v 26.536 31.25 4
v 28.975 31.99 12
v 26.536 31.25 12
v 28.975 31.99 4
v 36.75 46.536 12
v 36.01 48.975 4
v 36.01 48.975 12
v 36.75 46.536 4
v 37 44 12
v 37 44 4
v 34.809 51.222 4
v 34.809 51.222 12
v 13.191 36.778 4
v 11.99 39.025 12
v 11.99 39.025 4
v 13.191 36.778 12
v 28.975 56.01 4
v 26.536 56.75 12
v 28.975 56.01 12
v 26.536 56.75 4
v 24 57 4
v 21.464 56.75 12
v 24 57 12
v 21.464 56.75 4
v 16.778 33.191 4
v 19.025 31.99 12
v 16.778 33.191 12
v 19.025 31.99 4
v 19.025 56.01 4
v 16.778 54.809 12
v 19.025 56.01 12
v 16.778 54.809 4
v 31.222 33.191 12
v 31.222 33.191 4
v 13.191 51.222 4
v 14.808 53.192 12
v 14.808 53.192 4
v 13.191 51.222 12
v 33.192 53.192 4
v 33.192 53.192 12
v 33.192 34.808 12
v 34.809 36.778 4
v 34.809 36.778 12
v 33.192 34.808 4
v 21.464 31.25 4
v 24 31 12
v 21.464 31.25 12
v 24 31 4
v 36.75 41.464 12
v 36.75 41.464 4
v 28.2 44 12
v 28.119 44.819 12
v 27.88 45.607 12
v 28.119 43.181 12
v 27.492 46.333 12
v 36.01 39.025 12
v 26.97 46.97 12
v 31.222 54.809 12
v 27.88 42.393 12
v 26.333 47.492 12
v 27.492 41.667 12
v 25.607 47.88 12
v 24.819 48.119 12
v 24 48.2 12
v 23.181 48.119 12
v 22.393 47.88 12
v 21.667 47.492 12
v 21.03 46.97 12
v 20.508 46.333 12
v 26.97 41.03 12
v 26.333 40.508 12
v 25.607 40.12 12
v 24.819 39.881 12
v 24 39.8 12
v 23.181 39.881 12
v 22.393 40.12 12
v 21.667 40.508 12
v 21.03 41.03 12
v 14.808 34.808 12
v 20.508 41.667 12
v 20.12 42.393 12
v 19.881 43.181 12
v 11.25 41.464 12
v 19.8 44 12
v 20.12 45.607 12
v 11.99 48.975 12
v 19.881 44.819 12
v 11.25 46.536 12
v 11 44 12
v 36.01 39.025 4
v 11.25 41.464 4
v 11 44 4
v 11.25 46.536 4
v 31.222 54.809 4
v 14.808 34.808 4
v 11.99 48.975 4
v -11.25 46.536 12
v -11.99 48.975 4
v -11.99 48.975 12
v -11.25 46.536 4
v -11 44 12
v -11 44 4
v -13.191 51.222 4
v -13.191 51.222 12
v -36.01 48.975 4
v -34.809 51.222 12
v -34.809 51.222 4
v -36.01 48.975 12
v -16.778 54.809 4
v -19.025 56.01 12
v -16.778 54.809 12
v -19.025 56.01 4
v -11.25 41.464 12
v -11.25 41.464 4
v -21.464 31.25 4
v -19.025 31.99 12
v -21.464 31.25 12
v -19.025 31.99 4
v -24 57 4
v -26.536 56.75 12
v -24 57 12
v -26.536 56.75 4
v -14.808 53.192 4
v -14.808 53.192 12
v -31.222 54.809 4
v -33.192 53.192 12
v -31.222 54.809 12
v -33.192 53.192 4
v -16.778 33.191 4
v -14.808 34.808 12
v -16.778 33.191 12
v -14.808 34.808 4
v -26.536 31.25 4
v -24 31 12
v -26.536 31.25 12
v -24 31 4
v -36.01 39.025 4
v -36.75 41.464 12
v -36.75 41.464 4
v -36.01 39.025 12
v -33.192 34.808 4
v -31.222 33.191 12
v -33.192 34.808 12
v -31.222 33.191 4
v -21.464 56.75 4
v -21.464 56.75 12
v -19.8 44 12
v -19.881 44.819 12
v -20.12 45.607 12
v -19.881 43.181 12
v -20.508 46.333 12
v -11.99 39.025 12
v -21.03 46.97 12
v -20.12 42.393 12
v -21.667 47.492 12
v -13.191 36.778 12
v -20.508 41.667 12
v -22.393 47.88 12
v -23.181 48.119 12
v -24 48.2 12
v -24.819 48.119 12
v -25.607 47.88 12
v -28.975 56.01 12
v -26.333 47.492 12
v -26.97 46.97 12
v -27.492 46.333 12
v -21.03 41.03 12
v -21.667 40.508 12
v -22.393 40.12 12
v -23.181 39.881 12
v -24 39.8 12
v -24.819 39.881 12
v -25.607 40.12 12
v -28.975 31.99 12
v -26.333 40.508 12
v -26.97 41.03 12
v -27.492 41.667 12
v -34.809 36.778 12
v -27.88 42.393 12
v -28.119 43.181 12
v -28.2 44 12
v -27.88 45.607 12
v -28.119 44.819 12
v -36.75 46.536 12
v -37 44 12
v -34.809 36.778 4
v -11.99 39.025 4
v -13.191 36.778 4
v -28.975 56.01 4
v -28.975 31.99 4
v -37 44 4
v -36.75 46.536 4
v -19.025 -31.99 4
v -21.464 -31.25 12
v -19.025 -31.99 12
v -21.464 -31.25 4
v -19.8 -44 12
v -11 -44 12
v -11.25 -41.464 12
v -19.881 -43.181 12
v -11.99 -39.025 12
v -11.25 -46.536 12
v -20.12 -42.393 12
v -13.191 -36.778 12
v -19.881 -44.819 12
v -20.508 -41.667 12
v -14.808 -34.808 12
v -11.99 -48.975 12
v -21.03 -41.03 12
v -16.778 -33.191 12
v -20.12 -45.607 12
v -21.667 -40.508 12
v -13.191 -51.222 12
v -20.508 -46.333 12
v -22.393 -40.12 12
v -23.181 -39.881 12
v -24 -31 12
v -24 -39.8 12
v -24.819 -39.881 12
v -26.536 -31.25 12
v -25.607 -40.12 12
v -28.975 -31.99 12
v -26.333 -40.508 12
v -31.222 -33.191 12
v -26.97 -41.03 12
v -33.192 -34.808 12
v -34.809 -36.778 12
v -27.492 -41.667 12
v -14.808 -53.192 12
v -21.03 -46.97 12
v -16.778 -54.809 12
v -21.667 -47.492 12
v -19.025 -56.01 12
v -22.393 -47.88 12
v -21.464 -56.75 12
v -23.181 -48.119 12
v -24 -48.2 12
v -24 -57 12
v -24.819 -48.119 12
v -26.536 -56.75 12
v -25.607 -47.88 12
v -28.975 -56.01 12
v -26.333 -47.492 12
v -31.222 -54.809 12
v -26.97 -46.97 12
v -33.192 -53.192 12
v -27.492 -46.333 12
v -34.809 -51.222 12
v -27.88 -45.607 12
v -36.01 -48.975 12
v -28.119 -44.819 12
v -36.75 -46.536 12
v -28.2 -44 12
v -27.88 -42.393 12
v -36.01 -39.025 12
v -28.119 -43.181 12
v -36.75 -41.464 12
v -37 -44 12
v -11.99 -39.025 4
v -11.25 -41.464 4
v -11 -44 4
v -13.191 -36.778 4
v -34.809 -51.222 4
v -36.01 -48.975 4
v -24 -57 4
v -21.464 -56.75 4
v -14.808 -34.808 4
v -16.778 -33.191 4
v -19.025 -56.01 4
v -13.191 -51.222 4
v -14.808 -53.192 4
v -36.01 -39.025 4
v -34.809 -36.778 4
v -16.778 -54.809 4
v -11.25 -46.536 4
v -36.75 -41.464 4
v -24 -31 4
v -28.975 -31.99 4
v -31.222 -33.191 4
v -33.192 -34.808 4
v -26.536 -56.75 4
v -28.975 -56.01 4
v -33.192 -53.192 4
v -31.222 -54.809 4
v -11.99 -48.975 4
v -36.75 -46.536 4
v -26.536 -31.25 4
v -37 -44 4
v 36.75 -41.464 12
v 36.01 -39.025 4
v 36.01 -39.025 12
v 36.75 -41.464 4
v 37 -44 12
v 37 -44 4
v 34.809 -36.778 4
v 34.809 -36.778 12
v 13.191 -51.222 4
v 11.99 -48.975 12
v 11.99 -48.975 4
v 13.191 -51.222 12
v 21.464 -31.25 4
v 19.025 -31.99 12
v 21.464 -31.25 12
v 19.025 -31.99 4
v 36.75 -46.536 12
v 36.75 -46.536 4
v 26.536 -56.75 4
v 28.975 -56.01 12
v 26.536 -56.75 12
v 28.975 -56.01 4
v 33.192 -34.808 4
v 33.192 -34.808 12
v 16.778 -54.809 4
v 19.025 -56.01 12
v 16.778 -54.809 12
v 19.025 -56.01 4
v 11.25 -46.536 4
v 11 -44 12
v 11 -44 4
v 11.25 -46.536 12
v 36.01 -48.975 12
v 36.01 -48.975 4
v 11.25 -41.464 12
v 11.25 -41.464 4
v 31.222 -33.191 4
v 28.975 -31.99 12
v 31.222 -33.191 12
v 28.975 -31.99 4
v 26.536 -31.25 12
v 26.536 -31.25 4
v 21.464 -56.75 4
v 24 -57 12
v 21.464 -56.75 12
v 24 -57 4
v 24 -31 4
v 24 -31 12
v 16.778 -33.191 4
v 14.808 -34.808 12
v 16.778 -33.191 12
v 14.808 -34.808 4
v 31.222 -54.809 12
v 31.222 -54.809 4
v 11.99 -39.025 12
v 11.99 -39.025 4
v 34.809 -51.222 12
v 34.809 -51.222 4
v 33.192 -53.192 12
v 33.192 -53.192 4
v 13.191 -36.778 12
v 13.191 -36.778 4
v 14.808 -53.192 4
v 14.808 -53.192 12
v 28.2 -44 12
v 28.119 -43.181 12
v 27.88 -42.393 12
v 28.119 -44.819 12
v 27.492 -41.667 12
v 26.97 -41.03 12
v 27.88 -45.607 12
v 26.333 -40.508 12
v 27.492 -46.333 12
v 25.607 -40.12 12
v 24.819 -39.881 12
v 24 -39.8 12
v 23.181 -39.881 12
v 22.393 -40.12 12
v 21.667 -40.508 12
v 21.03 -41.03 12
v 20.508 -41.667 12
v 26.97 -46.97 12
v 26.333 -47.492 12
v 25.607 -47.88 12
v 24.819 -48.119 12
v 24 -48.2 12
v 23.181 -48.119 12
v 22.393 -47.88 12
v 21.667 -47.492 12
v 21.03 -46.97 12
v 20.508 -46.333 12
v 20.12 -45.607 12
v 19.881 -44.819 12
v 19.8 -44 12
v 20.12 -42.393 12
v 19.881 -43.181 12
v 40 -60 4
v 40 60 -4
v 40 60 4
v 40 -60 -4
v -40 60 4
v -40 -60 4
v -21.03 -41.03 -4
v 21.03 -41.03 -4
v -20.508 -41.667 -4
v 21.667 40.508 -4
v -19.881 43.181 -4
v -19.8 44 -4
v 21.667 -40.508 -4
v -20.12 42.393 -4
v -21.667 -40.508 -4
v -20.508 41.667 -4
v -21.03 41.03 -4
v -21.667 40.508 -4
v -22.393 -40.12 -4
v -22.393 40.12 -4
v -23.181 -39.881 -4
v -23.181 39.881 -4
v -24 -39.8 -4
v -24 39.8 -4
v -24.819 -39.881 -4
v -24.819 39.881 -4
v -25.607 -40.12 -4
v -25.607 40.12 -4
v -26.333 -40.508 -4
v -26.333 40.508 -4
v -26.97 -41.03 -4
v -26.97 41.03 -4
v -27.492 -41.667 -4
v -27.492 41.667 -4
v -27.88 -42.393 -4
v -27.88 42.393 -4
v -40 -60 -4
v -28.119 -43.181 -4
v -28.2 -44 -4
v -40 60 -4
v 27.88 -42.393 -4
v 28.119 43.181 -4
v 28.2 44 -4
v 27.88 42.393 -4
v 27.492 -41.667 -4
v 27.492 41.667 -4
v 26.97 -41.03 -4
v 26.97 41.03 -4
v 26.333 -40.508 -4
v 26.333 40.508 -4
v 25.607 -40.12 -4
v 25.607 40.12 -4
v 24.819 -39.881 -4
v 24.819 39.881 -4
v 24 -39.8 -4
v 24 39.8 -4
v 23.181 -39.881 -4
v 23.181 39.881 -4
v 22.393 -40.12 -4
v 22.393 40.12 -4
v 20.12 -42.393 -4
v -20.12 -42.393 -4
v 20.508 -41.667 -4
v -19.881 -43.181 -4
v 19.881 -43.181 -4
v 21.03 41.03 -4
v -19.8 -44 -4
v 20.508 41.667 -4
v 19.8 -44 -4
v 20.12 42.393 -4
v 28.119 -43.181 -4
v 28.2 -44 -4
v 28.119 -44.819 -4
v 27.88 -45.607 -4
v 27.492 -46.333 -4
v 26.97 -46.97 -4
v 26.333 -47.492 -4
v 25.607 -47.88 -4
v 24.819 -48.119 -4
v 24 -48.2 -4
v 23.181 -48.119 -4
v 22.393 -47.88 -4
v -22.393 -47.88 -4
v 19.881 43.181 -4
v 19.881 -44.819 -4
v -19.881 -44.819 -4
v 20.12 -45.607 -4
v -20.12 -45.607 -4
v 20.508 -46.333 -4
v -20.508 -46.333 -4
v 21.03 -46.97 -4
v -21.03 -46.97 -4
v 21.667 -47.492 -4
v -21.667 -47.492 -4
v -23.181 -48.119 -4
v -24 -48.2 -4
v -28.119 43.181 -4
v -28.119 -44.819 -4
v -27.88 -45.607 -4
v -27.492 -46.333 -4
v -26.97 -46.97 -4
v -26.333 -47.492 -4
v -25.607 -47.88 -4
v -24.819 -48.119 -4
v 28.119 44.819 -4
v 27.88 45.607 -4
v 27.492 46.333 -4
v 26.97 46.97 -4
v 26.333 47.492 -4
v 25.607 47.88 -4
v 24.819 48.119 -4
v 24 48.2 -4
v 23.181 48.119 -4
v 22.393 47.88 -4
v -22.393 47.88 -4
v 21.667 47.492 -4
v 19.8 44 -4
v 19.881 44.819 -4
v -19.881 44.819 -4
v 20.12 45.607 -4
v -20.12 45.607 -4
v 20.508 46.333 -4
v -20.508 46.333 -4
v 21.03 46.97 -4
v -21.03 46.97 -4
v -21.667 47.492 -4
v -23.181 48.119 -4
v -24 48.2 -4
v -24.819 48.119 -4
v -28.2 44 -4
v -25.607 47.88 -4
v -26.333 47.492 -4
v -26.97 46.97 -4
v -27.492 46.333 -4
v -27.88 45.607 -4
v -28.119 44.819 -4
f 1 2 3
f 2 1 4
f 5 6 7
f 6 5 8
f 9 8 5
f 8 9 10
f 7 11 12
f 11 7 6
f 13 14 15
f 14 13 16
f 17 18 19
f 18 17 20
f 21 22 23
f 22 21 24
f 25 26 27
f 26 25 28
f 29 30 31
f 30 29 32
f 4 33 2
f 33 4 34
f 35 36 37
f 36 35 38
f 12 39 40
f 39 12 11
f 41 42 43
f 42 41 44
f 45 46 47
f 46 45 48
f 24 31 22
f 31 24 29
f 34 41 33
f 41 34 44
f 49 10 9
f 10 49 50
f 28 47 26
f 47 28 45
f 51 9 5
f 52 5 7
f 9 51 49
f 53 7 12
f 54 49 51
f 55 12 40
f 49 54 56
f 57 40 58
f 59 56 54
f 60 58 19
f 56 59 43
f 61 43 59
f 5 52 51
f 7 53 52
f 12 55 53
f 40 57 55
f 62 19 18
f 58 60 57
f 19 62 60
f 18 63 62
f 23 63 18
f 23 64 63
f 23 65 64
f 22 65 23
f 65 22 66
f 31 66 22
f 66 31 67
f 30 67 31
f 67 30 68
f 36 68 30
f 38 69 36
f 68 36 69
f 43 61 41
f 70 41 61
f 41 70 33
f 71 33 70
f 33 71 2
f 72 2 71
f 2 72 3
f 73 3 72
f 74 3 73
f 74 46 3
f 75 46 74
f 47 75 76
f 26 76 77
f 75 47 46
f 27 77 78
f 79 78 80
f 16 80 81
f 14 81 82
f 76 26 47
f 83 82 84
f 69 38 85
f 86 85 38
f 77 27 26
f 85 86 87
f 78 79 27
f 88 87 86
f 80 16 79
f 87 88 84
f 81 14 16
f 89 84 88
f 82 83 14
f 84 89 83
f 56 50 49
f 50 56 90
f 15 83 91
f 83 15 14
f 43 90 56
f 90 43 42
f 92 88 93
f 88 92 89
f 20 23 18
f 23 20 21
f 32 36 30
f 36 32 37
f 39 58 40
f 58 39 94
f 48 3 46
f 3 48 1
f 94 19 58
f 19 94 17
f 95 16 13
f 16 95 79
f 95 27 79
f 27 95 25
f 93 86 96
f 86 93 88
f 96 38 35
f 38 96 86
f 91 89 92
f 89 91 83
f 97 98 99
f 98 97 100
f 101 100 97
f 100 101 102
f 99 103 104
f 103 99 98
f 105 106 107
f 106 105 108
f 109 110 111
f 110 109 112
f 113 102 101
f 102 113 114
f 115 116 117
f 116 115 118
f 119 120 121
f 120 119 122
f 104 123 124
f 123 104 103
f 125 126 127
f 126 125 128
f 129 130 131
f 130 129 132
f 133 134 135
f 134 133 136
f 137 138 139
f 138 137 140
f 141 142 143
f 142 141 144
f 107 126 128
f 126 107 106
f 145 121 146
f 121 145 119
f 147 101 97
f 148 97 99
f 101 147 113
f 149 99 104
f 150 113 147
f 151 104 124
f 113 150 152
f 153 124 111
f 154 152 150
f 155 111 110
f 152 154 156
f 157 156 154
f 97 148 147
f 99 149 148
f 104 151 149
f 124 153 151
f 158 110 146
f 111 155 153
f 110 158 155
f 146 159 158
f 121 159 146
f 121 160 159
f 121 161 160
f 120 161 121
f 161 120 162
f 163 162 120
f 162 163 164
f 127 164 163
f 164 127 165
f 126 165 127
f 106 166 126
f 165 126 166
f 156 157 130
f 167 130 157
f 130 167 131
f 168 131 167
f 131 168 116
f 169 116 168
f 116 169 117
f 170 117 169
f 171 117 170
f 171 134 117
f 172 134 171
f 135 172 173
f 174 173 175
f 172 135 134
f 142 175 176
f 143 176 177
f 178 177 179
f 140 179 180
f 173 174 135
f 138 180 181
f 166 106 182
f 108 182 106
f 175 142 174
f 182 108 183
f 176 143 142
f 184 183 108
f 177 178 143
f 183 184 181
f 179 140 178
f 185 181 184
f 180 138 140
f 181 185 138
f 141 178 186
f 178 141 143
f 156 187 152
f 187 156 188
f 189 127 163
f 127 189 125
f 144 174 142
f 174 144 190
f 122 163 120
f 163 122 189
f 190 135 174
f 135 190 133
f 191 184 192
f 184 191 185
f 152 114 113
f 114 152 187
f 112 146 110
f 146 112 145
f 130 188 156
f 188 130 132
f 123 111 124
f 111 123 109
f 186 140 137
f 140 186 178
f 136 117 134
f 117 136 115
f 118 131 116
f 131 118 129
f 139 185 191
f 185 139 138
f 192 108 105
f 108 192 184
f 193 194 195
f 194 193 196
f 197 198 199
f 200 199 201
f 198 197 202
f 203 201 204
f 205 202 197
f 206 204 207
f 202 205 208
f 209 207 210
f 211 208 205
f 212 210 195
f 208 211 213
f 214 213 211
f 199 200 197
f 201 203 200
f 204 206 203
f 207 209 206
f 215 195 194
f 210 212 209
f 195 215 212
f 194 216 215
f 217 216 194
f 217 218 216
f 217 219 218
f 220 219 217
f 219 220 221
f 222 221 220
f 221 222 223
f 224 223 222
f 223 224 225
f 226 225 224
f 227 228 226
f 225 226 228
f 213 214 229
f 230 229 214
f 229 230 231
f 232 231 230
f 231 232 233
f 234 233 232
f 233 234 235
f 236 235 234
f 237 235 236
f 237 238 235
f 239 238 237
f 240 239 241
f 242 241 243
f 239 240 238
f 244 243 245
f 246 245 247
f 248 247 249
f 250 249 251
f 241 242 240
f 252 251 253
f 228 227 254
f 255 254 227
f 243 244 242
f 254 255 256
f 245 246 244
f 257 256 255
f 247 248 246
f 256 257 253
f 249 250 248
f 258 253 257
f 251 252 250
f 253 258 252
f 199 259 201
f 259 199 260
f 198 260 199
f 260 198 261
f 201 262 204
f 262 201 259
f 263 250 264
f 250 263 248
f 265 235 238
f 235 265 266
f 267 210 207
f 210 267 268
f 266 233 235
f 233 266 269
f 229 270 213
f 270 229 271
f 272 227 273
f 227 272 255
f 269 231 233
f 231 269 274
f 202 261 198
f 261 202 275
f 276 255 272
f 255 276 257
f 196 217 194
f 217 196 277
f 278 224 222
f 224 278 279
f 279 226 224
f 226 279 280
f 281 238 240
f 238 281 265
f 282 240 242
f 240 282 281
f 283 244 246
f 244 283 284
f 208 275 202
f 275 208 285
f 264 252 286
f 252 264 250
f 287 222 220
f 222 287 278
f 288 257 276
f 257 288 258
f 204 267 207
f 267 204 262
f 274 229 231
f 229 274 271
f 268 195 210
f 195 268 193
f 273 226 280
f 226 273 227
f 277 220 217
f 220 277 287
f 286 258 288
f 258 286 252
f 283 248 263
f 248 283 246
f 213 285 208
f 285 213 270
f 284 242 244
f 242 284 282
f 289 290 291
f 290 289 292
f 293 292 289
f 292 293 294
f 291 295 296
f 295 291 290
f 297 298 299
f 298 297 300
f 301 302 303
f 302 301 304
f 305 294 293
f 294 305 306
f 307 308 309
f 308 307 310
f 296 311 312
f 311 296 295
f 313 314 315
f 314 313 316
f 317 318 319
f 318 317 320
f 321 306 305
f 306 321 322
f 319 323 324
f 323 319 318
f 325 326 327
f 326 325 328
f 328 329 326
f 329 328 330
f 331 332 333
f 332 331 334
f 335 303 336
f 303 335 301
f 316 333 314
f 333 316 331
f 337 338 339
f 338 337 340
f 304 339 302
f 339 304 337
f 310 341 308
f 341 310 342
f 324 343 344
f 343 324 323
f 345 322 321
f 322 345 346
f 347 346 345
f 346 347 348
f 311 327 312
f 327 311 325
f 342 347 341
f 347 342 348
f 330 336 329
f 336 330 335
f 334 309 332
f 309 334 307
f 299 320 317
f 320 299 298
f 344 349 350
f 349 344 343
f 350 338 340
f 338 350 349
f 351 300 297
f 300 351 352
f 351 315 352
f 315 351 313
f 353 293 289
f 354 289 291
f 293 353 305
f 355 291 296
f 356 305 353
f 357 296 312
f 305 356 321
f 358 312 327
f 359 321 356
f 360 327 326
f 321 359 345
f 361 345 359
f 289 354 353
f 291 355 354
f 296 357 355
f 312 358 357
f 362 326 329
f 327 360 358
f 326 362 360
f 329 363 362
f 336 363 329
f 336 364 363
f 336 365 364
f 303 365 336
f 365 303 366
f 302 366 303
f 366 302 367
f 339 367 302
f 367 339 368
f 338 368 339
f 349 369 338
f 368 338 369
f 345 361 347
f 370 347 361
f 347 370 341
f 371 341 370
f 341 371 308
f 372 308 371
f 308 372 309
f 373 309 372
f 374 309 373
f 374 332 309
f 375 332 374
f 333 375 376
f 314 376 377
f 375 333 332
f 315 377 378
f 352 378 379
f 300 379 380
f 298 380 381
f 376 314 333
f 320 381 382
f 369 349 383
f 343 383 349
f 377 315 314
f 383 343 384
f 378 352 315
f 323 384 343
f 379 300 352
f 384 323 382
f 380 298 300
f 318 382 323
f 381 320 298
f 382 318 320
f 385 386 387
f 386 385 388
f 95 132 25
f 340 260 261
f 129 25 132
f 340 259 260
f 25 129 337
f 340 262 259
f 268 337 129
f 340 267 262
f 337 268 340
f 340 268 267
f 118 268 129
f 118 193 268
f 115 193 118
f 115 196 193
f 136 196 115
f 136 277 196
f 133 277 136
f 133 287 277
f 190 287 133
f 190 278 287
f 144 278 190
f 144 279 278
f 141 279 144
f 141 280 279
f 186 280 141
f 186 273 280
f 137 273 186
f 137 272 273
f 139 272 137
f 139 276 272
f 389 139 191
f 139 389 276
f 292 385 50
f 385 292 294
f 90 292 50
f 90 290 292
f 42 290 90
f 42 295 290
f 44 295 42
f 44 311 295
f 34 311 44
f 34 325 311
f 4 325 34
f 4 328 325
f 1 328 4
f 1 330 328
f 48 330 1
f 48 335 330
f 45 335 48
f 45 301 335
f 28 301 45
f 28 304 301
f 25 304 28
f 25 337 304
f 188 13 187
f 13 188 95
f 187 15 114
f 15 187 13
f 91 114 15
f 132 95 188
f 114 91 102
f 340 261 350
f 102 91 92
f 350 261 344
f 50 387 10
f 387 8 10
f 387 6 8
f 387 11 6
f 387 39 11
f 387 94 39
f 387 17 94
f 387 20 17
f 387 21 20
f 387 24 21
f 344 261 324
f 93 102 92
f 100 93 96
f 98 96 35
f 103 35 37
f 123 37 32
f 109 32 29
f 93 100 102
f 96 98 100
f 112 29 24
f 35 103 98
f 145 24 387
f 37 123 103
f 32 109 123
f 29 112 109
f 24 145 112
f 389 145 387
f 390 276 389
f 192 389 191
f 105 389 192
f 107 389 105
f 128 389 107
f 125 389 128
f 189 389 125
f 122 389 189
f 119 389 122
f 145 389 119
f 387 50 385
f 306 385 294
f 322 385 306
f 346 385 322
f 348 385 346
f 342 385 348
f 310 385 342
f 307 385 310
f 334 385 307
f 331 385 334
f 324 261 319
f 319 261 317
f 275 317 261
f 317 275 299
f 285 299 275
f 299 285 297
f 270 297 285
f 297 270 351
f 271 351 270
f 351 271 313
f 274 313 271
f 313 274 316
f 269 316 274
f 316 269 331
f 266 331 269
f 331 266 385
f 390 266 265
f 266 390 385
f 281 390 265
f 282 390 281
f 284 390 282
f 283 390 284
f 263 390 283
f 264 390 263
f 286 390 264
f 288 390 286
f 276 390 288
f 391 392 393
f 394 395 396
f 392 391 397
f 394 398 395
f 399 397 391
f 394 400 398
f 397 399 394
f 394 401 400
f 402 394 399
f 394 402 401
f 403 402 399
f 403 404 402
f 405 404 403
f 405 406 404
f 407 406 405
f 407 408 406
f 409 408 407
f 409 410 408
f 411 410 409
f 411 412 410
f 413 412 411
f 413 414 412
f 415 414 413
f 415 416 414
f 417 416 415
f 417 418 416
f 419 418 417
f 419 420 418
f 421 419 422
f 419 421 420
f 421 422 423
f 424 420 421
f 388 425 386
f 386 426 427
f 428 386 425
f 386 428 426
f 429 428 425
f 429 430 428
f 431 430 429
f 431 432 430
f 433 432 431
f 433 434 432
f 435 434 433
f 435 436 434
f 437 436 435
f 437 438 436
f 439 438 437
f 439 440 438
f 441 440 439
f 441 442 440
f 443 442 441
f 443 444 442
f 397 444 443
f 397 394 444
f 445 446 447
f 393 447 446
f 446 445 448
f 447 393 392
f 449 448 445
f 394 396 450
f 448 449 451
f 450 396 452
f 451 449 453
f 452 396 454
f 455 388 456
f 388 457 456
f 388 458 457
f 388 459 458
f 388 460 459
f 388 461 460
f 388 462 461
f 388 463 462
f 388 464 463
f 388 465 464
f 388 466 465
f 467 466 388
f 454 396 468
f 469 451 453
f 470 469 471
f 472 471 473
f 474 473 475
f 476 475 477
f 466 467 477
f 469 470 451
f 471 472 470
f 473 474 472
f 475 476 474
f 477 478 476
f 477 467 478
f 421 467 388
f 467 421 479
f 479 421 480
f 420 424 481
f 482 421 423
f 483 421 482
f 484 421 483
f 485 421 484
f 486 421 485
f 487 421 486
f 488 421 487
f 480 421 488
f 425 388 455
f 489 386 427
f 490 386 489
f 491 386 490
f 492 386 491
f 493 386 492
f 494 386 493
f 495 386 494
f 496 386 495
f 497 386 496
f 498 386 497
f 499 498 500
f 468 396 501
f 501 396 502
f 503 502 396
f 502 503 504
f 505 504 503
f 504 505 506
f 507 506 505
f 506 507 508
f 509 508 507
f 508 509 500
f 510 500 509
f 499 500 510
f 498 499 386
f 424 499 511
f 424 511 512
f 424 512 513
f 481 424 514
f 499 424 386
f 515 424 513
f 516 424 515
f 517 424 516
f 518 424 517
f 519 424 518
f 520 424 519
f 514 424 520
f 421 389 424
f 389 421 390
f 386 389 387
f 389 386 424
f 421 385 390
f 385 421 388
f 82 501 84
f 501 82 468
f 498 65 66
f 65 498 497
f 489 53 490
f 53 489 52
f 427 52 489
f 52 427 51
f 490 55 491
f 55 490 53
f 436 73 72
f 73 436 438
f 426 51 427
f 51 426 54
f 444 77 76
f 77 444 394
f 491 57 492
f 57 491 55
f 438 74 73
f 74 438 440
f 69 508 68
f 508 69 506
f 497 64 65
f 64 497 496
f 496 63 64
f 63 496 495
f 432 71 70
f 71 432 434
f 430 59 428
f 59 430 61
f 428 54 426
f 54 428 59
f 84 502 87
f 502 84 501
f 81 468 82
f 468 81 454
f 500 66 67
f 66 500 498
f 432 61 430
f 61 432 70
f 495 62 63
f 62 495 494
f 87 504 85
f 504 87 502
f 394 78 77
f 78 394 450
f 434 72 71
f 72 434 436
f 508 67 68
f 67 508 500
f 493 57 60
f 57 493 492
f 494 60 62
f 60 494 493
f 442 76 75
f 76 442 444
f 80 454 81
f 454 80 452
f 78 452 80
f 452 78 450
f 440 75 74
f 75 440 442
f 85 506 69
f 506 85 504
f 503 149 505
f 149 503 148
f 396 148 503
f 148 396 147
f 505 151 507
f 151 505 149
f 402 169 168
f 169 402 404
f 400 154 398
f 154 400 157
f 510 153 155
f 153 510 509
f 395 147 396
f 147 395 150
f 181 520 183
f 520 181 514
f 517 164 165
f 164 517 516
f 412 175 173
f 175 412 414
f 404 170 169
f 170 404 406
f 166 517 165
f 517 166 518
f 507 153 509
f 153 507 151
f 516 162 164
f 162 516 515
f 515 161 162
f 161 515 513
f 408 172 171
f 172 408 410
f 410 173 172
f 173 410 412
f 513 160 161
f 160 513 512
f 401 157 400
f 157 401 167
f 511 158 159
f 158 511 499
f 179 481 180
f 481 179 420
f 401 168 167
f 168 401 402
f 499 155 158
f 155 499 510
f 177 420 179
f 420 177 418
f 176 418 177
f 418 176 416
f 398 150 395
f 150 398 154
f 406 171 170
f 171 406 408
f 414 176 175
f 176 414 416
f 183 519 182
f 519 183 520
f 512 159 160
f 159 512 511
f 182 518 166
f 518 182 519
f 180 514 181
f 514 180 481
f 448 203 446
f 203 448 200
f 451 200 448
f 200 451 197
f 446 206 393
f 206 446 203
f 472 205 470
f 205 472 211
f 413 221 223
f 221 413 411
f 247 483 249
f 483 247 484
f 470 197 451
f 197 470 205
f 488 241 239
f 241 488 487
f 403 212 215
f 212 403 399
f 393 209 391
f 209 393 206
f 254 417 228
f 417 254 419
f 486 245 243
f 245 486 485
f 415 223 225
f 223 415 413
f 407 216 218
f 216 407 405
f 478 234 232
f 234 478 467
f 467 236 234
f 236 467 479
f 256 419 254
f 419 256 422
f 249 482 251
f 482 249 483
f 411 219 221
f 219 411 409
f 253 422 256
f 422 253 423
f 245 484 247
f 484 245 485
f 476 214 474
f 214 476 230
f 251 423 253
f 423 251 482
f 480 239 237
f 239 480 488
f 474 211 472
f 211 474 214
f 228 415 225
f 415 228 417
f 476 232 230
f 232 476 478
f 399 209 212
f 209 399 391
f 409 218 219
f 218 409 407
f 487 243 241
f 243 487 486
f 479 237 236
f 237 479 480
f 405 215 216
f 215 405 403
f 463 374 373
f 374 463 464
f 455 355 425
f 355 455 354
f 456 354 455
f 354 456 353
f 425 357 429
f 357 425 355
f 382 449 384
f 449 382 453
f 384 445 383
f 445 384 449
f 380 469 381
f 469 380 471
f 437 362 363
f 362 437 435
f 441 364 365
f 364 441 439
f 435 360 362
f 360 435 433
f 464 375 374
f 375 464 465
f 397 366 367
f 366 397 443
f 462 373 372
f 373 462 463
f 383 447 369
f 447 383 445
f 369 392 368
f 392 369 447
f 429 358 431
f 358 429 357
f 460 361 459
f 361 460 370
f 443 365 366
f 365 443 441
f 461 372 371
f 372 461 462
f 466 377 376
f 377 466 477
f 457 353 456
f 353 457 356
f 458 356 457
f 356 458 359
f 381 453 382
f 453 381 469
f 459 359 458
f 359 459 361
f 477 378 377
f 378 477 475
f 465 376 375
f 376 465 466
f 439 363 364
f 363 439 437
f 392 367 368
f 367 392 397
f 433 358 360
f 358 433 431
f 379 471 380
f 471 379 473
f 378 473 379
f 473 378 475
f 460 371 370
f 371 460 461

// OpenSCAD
$fn = 32;

// ----------------------------------------------------------------------
// Anchor pads 80 x 120 x 16
// four corner bosses with anchor holes
// ----------------------------------------------------------------------

// --- parameters (mm) ---
plate = [80, 120, 8];  // base plate size (x, y, z)
seat_tol = 0.15;       // tolerance at the seating features
free_tol = 0.5;        // general tolerance on the free sizes
pads = 4;              // boss count, one per corner
edge = 16;             // boss centre offset from the plate edge
boss_d = 26;           // boss diameter
boss_h = 8;            // boss height above the base plate
hole_d = 8.4;          // hole diameter

// --- derived feature positions (mm) ---
height = plate[2] + boss_h;      // = 16   overall height of the part
corner_x = plate[0] / 2 - edge;  // = 24   boss centre X
corner_y = plate[1] / 2 - edge;  // = 44   boss centre Y
feature_centers = [
  [corner_x, corner_y],
  [-corner_x, corner_y],
  [-corner_x, -corner_y],
  [corner_x, -corner_y]
];   // boss centres, anchor holes are drilled there

// base plate, four bosses standing on it, anchor holes all the way through
difference() {
  union() {
    cube(plate, center = true);
    for (centre = feature_centers)
      translate([centre[0], centre[1], plate[2] / 2 - 1])
        cylinder(d = boss_d, h = boss_h + 1);
  }
  for (centre = feature_centers)
    translate([centre[0], centre[1], -height])
      cylinder(d = hole_d, h = 2 * height + 2);  // through boss and plate
}
